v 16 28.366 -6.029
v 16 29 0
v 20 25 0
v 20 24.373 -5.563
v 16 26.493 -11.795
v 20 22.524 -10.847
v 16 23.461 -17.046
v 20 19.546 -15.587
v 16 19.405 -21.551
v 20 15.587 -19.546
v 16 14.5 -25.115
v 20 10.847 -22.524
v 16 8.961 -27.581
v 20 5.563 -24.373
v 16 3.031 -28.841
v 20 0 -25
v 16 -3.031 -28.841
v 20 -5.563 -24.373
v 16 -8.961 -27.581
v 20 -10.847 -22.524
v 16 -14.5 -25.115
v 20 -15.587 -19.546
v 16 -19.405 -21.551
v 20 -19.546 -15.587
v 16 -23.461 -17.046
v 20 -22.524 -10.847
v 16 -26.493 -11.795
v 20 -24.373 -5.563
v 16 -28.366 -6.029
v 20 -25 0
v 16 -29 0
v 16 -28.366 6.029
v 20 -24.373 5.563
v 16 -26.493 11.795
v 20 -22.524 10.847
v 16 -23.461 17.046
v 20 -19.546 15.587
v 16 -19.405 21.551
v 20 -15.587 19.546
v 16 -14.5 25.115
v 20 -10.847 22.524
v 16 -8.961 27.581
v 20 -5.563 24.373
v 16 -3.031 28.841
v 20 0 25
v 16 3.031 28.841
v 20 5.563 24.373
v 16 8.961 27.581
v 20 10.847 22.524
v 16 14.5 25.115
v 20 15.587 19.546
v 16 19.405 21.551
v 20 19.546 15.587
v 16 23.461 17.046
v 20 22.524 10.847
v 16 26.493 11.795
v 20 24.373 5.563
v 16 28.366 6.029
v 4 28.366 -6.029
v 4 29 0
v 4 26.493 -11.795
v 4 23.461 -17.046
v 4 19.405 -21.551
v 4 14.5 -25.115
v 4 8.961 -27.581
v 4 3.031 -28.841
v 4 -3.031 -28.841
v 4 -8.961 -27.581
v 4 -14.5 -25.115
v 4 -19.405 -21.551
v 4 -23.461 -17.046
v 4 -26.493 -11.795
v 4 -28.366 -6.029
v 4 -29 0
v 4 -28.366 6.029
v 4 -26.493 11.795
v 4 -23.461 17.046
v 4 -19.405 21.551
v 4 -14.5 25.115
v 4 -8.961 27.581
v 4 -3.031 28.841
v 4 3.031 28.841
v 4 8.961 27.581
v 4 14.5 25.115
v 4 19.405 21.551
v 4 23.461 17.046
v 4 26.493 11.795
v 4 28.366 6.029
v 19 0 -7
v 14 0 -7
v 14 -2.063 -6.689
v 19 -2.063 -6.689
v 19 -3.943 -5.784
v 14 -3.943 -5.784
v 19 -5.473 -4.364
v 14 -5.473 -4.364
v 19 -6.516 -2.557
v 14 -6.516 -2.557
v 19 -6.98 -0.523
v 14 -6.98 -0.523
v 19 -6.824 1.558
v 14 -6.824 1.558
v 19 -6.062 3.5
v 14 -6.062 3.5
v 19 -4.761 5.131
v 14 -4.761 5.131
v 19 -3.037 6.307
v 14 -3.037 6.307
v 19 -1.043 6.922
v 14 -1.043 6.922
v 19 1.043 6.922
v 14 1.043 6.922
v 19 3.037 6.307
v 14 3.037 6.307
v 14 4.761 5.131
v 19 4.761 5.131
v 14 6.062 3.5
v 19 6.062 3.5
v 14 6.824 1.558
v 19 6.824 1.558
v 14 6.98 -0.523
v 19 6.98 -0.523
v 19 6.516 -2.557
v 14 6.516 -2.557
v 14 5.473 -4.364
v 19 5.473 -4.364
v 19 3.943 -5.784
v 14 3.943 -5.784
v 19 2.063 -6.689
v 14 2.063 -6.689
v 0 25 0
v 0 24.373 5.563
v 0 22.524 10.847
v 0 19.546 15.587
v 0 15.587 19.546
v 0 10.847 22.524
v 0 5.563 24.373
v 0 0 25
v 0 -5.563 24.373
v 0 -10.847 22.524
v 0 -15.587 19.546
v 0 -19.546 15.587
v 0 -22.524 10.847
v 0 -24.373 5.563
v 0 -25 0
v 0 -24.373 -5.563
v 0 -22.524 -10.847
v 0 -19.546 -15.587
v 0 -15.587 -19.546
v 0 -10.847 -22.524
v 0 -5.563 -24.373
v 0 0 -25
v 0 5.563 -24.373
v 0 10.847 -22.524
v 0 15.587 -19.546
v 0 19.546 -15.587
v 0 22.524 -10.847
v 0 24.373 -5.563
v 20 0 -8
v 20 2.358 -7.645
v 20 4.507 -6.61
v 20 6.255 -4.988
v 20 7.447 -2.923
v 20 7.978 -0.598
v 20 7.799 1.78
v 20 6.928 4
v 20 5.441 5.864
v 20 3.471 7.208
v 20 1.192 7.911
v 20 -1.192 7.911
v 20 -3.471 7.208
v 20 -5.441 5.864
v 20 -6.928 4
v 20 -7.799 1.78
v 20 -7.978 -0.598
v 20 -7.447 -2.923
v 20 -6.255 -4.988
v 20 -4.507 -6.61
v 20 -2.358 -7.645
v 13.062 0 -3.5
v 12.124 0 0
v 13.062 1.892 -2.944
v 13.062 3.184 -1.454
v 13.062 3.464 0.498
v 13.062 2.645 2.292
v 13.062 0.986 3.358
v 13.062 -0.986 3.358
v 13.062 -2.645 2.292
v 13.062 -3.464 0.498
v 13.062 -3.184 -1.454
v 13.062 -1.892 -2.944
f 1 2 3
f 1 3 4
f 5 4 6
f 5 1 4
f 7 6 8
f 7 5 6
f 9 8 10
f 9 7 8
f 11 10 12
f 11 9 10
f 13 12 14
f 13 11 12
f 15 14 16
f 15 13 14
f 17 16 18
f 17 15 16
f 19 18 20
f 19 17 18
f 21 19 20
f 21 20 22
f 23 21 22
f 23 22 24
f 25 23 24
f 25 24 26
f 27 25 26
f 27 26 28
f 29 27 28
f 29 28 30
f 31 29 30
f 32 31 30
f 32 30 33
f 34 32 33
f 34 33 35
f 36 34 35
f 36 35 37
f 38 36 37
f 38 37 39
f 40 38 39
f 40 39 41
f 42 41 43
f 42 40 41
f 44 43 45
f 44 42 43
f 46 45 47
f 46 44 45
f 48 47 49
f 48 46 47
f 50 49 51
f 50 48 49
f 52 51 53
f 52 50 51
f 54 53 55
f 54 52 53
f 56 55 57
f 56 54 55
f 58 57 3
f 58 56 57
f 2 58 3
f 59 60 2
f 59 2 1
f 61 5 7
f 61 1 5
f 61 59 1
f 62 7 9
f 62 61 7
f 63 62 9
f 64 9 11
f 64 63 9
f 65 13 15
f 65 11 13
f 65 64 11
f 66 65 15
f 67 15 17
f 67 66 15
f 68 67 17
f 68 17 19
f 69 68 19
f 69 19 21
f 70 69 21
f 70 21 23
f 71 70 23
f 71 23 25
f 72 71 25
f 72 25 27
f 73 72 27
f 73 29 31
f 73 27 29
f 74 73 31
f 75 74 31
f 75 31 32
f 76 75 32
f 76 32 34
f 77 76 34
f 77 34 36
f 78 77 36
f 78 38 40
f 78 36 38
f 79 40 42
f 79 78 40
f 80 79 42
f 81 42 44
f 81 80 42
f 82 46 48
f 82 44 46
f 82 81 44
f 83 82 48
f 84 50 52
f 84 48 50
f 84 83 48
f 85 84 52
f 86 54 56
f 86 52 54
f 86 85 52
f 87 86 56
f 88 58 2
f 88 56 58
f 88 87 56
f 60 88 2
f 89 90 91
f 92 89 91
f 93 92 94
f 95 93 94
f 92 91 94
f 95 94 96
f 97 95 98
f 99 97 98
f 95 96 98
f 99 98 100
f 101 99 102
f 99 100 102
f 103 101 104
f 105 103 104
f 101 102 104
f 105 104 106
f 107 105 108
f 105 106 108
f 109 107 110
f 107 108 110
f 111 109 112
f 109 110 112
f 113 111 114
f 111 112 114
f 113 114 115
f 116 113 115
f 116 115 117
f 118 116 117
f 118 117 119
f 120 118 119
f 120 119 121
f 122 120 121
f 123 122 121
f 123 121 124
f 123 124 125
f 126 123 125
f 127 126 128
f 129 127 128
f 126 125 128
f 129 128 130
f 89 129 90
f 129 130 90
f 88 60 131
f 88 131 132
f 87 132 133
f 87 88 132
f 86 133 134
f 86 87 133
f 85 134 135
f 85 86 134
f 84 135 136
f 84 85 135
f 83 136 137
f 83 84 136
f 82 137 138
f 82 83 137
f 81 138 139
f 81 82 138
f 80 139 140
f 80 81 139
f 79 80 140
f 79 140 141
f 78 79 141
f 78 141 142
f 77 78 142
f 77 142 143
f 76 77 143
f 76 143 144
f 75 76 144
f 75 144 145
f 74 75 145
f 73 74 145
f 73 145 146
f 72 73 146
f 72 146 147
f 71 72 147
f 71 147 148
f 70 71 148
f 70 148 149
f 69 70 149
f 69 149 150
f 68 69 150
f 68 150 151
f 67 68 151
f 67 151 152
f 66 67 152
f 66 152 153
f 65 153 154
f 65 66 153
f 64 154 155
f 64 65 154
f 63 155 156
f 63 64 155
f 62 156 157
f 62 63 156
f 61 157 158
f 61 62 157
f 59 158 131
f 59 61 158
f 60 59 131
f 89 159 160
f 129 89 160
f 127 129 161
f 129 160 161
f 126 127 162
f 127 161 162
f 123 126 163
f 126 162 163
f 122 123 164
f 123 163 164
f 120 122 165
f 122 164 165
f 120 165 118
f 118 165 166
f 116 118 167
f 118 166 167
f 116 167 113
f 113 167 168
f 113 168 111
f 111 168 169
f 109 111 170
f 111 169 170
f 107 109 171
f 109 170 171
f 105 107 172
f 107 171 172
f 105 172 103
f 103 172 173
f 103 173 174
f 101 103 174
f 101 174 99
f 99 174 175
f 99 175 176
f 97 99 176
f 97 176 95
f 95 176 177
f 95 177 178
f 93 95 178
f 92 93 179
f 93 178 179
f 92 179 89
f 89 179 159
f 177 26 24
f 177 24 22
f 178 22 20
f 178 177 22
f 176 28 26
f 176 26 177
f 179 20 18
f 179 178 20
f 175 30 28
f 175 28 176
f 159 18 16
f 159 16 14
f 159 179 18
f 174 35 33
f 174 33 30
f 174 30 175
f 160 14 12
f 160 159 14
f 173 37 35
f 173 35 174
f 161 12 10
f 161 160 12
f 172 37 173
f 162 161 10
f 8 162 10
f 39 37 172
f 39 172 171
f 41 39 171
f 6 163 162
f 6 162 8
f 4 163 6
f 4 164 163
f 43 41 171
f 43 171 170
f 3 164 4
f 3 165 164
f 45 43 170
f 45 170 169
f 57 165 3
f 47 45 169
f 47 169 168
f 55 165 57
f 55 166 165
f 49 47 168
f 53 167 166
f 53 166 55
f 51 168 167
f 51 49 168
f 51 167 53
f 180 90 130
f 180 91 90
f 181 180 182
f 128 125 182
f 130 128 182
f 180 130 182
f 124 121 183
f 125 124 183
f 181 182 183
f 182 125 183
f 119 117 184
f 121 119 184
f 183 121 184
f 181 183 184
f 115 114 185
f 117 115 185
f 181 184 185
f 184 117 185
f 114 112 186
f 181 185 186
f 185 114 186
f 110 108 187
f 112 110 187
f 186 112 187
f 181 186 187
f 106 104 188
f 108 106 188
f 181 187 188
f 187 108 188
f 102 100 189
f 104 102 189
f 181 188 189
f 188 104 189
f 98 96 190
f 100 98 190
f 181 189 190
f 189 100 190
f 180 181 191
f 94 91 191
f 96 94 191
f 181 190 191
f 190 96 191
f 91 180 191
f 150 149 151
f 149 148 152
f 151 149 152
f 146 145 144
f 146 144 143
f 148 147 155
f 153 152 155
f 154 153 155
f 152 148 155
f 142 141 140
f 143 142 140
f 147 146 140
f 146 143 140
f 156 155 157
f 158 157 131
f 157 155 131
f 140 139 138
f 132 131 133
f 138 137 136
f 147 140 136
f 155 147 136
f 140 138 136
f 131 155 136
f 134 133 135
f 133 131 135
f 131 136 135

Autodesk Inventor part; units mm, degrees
ref_plane "YZ Plane" through (0, 0, 0) normal (1, 0, 0) x (0, 1, 0)
ref_plane "XZ Plane" through (0, 0, 0) normal (0, 1, 0) x (-1, 0, 0)
ref_plane "XY Plane" through (0, 0, 0) normal (0, 0, 1) x (1, 0, 0)
sketch "Эскиз3" plane through (0, 0, 0) normal (0, 0, 1) x (1, 0, 0)
  line L0 (0, 0) -> (20, 0)
  line L1 (20, 0) -> (20, 25)
  line L2 (16, 29) -> (4, 29)
  line L3 (0, 25) -> (0, 0)
  line L4 (4, 29) -> (0, 25)
  line L5 (16, 29) -> (20, 25)
  point P0 (20, 29)
  point P1 (0, 29)
  dimension "d18" = 20
  dimension "d19" = 29
  dimension "d20" = 4
  dimension "d21" = 4
  dimension "d22" = 4
  dimension "d23" = 4
revolve "Вращение2" add sketch "Эскиз3" angle 360 about axis through (0, 0, 0) along (1, 0, 0)
sketch "Эскиз4" plane through (20, 0, 0) normal (1, 0, 0) x (0, 0, -1)
  point P0 (0, 0)
  point P1 (0, 0)
hole "Отверстие2" at (20, 0, 0) direction (-1, 0, 0) diameter 14 depth 6 tip angle 150 countersink diameter 16 countersink angle 90
thread "Резьба3" size "M14x2" class "6H" standard "ANSI Metric M Profile" full length
equation "\"d21\" = d20"
equation "\"d22\" = d20"
equation "\"d23\" = d22"
properties part number "711131"
